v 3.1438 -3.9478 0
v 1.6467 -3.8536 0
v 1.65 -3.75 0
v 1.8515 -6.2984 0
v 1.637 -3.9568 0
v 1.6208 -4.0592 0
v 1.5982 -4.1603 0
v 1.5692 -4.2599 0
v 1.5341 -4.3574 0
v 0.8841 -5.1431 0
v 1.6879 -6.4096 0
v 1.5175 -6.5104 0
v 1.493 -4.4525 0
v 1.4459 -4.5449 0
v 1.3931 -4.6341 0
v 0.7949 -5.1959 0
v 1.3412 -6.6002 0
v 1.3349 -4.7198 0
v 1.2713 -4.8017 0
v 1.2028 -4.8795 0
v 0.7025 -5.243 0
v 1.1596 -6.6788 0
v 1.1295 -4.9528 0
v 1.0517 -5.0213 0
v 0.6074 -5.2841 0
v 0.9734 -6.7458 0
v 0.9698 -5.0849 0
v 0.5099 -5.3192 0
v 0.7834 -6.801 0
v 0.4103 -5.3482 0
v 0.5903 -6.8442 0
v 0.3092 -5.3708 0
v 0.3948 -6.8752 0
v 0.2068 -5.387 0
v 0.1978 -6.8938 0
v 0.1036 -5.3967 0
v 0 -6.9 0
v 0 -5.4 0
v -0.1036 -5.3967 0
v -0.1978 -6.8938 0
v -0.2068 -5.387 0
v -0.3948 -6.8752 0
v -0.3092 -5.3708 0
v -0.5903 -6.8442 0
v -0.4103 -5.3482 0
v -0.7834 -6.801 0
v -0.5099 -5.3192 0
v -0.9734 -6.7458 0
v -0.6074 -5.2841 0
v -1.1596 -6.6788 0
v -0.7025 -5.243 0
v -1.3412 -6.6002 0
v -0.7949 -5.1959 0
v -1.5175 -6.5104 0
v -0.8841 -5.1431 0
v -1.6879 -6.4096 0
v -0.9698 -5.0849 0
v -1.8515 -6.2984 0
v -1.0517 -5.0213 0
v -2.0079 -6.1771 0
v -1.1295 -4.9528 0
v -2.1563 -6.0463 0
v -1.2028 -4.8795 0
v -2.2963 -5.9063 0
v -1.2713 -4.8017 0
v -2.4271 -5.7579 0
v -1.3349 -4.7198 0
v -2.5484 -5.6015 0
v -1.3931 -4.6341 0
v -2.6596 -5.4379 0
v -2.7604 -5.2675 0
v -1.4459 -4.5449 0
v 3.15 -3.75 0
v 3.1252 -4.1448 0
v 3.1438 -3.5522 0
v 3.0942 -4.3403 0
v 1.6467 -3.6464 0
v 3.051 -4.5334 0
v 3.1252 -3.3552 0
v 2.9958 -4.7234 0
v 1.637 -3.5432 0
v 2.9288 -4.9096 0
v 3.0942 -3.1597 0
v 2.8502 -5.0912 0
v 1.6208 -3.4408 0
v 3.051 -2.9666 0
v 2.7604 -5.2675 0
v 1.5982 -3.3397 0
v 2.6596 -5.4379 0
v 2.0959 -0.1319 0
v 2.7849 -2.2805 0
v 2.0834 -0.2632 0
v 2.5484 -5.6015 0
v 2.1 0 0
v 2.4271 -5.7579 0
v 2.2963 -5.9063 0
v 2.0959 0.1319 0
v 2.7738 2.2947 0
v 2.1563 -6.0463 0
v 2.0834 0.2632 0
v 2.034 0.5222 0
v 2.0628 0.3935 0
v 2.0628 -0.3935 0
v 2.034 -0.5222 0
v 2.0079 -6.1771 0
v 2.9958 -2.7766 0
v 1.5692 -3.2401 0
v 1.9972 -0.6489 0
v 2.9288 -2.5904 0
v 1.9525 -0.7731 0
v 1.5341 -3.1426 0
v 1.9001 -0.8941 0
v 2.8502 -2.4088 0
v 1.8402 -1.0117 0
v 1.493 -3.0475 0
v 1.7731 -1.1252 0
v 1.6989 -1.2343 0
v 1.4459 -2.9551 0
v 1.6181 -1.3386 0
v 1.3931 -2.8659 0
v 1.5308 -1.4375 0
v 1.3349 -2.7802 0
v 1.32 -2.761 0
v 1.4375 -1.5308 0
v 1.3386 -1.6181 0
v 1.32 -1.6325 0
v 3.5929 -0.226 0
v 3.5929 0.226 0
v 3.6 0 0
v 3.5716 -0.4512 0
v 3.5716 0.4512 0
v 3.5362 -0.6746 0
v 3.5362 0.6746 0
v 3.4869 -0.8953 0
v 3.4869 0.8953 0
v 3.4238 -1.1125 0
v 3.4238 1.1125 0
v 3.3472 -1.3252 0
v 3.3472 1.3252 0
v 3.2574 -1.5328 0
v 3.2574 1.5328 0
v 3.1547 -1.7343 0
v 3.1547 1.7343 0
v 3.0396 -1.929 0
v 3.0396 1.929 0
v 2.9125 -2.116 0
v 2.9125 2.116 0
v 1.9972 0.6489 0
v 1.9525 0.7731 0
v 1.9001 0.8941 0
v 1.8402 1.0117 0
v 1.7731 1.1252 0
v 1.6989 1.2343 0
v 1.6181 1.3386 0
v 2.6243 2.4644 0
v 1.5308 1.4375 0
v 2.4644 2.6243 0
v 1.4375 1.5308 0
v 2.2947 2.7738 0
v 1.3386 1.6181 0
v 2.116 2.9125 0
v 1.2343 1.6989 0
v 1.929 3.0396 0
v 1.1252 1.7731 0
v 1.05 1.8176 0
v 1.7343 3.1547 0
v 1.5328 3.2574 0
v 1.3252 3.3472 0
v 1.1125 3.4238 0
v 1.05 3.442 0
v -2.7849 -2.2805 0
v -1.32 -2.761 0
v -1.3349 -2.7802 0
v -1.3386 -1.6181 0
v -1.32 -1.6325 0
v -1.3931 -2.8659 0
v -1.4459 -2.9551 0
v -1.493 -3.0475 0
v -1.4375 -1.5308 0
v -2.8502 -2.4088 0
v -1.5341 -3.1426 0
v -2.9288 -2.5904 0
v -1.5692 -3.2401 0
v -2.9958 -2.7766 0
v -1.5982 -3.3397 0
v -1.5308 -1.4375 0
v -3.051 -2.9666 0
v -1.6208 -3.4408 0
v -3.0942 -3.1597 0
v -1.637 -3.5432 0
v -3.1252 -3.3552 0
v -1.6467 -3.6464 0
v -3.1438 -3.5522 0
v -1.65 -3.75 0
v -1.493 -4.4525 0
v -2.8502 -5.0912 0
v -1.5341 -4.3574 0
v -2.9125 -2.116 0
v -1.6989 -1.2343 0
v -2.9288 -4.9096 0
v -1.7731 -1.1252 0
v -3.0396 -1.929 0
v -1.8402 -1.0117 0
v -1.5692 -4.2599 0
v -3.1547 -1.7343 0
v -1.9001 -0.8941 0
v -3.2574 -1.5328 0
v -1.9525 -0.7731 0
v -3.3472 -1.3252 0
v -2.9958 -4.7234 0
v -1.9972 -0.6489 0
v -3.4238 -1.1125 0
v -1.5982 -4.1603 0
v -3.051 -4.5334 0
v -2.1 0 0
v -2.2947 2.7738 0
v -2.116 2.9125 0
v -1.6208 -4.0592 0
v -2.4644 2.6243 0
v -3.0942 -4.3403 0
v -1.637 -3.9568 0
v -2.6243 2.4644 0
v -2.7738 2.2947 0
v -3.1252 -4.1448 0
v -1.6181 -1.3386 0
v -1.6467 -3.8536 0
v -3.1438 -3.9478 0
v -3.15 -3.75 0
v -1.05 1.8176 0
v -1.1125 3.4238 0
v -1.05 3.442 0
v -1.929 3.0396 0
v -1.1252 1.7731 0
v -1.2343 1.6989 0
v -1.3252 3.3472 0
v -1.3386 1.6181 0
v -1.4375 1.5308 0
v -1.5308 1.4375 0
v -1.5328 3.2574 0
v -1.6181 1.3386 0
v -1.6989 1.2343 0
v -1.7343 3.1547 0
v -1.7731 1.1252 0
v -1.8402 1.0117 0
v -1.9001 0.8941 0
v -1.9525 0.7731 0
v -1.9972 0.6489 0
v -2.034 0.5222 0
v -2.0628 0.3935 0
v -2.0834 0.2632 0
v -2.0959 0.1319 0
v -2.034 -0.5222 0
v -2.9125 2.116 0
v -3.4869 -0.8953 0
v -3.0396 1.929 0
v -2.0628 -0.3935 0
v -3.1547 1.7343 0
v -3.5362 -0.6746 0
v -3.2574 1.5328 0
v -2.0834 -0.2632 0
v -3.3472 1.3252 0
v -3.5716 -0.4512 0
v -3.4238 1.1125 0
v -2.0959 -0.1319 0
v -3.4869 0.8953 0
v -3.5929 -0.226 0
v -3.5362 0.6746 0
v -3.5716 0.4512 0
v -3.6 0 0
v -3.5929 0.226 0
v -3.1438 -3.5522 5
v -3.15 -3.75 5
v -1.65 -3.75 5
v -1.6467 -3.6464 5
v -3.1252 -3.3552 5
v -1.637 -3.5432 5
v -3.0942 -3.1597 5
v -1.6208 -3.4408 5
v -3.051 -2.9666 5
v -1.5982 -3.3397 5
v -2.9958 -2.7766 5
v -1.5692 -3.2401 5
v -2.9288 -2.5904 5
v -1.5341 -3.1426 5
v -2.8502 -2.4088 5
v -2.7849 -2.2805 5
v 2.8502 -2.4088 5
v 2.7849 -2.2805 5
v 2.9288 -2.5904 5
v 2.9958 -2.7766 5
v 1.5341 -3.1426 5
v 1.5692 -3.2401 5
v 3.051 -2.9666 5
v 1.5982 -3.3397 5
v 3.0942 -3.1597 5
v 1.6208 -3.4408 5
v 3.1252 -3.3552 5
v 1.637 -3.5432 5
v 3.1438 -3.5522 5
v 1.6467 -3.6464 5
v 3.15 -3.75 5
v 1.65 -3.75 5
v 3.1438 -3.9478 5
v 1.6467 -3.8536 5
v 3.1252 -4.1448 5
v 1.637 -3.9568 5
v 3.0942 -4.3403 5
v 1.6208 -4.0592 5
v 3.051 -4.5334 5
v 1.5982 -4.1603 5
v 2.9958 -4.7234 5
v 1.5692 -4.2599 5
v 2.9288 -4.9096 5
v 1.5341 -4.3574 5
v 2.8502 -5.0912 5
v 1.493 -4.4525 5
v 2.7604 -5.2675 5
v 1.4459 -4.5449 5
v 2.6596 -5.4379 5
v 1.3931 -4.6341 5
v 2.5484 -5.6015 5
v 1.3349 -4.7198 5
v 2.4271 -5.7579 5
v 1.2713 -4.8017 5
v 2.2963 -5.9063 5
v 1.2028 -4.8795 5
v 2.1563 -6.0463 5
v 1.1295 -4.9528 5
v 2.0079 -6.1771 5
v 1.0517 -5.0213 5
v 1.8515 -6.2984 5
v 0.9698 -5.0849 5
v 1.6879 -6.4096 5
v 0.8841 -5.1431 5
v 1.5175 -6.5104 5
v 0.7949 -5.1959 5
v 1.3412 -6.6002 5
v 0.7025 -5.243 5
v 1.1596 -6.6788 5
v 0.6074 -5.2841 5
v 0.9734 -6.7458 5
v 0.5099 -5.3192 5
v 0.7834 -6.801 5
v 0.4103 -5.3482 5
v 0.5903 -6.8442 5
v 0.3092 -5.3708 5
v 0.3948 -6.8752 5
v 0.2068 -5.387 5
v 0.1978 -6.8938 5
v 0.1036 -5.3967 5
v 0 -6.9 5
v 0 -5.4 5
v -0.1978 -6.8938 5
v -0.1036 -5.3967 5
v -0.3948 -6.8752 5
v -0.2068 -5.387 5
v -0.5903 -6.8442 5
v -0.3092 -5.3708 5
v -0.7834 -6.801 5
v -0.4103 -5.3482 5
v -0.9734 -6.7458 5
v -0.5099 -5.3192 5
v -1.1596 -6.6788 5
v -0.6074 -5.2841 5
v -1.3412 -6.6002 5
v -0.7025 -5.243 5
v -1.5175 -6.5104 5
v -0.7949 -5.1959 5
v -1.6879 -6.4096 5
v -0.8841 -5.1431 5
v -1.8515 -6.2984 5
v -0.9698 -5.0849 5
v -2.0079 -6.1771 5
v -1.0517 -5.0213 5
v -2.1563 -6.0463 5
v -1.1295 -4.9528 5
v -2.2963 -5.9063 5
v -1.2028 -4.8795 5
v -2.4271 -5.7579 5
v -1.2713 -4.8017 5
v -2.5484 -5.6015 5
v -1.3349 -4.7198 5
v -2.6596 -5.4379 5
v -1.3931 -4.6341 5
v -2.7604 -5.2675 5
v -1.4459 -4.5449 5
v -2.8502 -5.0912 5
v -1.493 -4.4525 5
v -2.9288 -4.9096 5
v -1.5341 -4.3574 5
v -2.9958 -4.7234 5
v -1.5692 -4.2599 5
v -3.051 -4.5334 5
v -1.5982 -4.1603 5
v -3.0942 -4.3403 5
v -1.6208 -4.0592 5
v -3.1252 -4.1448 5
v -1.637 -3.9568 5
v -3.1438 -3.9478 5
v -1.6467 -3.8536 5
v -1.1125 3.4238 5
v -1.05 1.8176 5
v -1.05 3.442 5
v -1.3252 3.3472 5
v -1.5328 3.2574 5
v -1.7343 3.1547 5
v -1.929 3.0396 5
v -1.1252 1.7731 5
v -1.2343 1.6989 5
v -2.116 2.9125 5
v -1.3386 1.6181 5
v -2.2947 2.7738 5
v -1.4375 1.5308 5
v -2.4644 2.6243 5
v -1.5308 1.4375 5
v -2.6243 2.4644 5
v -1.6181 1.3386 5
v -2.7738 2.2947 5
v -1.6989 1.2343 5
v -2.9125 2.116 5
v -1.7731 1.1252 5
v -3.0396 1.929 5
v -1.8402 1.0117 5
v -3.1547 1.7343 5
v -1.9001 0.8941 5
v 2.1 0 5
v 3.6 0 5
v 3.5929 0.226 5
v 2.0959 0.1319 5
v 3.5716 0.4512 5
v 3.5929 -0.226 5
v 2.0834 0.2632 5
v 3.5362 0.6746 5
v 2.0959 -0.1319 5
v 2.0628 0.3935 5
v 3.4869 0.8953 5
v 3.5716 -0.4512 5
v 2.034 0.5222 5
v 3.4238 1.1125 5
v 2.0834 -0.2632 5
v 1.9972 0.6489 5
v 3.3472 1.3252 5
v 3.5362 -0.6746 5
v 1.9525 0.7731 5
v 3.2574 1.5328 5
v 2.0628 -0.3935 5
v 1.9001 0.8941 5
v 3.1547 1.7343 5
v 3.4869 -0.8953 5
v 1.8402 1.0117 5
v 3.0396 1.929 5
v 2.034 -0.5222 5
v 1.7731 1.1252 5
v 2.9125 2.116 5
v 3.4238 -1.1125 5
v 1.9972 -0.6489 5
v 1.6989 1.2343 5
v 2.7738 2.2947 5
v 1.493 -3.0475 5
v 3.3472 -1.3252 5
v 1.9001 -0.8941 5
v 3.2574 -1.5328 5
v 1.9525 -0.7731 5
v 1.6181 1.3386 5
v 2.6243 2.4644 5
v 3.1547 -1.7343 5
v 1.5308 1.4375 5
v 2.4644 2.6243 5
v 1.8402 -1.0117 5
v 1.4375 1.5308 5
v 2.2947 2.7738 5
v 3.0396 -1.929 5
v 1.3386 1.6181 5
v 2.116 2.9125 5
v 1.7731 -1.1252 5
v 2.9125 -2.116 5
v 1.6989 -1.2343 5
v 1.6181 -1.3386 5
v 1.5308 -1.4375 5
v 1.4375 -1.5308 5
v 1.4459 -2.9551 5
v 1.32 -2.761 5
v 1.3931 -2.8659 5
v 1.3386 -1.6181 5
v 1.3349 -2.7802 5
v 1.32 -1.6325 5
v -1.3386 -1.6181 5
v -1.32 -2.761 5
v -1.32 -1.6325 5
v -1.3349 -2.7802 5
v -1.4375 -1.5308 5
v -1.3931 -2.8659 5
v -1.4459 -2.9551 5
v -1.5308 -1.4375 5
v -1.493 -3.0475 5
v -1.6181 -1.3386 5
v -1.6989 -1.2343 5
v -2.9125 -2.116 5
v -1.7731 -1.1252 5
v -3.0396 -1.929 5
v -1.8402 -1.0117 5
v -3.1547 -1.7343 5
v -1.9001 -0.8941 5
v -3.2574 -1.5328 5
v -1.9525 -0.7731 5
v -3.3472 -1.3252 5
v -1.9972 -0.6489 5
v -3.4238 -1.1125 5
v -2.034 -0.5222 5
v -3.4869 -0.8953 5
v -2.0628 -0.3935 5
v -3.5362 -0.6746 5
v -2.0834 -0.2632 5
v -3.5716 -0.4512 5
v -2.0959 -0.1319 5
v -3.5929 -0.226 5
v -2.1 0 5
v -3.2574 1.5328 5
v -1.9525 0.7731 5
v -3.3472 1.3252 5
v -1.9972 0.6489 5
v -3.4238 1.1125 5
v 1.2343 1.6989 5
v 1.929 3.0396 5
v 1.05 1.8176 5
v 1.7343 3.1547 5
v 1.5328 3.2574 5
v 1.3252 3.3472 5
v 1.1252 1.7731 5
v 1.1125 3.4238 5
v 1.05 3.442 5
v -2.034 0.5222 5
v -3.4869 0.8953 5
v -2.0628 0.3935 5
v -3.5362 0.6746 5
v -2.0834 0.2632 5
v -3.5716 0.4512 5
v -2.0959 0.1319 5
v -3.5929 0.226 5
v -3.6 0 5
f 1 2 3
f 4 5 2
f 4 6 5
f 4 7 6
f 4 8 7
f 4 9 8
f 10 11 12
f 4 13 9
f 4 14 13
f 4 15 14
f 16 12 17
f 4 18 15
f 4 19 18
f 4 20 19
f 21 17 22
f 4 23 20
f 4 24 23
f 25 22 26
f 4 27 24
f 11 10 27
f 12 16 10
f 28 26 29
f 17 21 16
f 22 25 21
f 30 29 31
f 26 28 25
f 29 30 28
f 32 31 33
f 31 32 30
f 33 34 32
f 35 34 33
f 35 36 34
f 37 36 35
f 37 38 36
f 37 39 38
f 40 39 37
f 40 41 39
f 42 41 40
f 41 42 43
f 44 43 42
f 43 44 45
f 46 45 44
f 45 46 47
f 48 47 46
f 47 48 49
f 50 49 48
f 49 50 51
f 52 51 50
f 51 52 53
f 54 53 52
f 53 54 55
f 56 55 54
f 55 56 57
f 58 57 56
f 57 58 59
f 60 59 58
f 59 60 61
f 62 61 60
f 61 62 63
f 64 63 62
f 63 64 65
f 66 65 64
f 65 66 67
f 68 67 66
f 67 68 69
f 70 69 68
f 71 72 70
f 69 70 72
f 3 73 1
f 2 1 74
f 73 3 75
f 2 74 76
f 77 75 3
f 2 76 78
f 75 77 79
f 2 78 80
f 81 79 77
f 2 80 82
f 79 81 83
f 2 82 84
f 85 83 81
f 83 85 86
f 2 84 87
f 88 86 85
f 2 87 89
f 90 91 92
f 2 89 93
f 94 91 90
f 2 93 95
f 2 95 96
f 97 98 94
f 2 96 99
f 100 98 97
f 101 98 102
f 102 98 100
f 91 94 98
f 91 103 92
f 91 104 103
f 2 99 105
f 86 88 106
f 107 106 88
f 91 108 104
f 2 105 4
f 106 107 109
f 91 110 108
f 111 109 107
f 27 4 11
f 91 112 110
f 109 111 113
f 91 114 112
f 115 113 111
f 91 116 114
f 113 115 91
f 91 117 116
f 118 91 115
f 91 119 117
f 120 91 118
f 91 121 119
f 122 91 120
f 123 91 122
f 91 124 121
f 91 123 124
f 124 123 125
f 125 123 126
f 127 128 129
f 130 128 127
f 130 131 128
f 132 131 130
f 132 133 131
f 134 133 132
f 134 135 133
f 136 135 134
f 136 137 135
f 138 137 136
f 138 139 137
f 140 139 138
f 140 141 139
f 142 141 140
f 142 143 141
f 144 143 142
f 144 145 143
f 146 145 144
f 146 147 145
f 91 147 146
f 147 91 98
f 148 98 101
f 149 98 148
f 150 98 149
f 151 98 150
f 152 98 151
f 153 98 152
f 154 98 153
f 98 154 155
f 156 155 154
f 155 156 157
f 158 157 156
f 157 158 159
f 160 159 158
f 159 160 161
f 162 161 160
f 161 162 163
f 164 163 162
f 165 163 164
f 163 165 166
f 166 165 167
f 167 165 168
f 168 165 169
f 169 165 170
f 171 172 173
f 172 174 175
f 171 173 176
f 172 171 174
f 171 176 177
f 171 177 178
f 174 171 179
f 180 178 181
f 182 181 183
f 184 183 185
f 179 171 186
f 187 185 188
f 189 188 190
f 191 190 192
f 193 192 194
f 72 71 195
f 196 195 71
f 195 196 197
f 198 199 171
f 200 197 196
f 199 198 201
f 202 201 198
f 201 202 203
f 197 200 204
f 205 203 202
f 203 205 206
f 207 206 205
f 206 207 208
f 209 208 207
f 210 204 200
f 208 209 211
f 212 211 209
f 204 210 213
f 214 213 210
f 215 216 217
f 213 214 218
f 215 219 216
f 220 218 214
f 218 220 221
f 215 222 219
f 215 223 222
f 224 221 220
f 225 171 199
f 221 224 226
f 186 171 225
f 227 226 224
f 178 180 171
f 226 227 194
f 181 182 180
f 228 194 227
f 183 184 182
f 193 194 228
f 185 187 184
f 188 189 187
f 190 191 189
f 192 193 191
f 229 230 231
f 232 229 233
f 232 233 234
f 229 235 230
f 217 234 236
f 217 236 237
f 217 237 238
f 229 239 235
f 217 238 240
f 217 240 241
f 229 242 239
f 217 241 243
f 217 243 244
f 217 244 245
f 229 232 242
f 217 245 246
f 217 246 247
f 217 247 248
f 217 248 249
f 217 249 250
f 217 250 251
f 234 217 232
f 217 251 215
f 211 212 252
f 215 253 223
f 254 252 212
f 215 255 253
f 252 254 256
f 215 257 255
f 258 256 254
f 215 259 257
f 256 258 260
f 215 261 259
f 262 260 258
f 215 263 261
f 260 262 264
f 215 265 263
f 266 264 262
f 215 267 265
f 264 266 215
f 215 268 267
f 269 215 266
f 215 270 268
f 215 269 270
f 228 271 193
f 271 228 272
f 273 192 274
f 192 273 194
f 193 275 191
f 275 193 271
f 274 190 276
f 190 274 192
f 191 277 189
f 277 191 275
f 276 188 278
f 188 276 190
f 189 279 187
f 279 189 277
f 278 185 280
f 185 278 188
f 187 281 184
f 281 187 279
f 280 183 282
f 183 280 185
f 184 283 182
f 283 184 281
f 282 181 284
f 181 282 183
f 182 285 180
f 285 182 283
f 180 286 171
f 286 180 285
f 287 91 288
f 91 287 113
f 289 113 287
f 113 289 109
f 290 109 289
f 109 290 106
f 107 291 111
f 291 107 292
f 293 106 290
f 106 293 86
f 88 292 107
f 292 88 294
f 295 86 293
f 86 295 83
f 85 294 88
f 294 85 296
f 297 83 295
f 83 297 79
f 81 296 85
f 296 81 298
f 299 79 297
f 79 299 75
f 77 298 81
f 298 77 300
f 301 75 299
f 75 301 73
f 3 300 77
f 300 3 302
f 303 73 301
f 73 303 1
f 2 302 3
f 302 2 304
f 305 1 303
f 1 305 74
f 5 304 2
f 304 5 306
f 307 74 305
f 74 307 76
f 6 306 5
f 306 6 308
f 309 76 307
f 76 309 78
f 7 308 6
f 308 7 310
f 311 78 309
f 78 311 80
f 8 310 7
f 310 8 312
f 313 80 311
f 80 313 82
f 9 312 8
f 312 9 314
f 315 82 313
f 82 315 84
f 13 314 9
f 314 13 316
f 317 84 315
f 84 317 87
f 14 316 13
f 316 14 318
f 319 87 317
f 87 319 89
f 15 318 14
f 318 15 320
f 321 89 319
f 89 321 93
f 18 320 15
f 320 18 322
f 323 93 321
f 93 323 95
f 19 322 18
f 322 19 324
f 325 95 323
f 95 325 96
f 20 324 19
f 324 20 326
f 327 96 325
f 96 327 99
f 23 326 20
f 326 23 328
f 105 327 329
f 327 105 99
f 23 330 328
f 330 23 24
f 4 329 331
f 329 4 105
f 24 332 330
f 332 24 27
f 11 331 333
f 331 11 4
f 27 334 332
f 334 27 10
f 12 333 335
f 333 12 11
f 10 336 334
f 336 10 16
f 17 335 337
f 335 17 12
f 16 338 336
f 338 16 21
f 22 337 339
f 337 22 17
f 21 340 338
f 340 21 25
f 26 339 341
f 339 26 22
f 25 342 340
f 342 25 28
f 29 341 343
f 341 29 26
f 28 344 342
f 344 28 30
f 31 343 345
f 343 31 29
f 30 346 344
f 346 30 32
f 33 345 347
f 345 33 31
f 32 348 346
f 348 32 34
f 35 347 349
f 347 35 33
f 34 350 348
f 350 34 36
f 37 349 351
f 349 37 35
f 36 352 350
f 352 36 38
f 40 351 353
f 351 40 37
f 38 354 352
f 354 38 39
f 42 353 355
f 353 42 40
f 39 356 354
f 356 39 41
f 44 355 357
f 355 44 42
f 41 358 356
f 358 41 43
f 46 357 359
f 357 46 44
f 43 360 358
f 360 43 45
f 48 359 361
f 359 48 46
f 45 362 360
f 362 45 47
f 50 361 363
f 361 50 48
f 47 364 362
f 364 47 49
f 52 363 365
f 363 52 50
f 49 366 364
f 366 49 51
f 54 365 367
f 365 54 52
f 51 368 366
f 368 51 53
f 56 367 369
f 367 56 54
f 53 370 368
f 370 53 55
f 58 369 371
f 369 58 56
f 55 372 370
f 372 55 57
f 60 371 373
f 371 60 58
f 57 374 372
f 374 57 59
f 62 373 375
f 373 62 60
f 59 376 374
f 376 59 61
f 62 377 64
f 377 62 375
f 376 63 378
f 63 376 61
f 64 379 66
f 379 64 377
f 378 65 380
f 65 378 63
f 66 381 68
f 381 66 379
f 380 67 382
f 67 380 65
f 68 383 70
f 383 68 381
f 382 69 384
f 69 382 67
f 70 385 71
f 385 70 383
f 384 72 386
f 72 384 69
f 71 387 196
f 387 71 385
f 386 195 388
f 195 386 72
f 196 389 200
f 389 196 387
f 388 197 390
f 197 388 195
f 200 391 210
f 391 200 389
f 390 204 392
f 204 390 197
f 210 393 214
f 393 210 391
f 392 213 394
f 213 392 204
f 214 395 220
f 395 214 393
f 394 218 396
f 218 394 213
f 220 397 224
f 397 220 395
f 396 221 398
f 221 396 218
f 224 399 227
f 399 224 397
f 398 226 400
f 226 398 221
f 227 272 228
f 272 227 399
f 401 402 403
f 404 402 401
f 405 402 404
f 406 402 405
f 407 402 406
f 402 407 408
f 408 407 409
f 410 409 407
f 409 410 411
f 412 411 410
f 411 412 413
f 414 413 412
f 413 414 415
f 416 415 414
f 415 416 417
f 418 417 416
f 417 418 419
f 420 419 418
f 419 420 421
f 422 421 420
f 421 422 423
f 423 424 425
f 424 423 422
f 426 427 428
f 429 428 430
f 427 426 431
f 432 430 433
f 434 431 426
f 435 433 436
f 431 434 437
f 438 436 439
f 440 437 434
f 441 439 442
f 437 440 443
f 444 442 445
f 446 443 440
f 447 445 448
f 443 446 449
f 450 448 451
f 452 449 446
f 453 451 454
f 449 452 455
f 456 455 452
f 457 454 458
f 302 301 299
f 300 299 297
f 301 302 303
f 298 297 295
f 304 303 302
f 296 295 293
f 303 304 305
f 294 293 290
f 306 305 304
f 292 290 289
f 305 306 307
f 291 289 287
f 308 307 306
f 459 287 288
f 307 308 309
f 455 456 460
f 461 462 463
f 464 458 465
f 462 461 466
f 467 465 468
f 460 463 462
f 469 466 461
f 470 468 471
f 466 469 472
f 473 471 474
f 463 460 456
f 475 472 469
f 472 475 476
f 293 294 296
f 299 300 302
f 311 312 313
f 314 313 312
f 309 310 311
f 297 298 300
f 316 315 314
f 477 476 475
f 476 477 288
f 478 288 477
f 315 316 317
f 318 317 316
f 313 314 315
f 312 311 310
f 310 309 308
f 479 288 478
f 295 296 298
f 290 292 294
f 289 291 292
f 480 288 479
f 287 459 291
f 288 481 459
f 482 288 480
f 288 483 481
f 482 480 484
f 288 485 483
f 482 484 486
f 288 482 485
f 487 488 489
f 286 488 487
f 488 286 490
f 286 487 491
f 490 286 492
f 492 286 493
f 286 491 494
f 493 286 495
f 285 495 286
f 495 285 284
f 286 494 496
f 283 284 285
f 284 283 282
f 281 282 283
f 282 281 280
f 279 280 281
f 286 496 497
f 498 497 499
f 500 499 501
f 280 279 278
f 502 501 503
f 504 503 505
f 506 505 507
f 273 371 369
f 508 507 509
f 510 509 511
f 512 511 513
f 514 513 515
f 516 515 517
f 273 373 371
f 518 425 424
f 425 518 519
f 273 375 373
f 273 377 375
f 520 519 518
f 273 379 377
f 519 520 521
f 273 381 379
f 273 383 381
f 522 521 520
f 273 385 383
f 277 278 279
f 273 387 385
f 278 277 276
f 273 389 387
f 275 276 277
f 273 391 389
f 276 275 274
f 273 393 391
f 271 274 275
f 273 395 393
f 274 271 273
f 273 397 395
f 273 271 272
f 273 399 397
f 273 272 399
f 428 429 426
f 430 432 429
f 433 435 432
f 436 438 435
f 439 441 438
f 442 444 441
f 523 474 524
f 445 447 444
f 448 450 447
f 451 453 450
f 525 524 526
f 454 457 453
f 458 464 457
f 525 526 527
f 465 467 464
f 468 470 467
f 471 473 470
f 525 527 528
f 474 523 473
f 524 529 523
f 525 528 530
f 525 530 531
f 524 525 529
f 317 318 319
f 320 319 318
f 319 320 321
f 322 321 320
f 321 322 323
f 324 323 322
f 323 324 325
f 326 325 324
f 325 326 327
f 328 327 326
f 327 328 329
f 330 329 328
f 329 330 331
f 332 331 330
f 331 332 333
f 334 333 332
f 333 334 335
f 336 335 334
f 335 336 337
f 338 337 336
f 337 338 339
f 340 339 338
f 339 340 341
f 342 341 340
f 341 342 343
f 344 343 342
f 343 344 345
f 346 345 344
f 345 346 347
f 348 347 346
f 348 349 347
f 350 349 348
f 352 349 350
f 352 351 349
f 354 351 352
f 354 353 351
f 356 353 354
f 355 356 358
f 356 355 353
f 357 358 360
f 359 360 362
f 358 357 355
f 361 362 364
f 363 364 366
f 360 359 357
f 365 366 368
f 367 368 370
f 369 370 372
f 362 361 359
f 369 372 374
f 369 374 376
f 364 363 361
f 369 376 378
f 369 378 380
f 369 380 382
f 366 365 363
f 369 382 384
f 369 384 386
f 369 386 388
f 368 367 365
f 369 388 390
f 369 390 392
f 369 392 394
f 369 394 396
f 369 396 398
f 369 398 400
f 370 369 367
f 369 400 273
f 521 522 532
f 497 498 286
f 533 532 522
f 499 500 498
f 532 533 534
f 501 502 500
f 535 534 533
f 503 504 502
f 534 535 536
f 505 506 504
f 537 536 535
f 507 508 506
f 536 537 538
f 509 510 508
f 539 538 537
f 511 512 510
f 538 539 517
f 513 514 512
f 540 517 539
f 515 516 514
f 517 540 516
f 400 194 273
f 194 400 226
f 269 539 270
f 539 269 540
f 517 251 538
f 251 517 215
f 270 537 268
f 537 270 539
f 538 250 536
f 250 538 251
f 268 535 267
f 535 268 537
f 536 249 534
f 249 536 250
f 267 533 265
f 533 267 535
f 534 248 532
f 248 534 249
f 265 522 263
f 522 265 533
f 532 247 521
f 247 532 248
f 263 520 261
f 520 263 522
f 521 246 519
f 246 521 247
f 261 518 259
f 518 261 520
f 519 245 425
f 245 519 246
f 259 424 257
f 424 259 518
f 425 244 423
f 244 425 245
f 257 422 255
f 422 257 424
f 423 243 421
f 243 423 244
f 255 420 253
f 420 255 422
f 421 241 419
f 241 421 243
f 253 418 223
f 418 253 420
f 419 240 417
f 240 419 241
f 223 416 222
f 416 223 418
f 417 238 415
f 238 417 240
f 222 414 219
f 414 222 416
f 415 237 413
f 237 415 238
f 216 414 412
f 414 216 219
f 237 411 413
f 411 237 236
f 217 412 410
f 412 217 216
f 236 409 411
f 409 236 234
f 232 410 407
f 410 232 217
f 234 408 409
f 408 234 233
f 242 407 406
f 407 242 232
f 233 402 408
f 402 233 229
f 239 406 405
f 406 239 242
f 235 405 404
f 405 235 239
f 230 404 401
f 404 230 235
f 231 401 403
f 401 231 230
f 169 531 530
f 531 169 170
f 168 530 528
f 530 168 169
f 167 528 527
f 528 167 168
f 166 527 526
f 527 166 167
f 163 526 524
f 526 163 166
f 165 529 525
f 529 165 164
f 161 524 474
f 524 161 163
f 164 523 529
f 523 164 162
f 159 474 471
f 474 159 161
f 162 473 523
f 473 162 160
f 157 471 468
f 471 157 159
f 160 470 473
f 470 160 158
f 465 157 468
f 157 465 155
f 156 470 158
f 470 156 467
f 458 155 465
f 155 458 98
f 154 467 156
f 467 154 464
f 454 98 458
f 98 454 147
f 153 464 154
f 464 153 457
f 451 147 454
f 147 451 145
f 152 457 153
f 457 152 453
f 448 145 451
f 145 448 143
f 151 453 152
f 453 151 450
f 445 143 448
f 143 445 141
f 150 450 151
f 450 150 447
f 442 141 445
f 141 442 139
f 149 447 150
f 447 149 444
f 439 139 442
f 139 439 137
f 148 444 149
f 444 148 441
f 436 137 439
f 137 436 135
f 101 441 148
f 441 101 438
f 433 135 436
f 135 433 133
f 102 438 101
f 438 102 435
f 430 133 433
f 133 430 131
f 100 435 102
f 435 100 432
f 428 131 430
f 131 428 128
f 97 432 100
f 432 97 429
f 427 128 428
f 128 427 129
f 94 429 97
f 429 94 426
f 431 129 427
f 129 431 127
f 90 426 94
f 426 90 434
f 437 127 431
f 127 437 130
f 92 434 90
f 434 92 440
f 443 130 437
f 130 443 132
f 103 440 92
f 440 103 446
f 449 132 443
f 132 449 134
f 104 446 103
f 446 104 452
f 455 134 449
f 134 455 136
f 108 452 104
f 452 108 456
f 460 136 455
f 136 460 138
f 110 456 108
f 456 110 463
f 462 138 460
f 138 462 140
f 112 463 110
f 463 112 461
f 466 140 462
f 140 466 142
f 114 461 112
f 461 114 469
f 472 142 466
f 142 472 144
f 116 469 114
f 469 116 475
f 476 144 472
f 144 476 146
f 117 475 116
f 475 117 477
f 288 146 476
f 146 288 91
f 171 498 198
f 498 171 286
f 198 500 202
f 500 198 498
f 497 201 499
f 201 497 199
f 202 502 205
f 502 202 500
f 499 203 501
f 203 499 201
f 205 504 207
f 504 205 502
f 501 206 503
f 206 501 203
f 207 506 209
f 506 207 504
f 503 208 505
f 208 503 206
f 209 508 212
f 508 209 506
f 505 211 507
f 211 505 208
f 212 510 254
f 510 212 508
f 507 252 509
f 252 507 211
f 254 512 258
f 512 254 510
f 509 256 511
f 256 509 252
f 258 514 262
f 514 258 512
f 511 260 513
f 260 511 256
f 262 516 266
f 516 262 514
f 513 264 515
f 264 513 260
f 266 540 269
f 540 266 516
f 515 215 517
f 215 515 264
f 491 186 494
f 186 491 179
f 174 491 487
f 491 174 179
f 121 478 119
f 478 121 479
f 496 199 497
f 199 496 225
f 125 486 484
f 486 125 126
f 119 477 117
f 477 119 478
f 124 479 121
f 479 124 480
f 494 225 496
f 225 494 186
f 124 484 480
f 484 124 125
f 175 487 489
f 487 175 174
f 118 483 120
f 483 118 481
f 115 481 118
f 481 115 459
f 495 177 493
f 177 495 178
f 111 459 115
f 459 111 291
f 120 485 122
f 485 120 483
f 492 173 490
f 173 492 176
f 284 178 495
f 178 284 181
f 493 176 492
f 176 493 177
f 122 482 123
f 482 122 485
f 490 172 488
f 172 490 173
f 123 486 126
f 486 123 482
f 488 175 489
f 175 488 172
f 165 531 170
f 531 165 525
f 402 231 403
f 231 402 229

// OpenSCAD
/*
    (c) by Marc Hoppe, 2018

    This program is free software: you can redistribute it and/or modify
    it under the terms of the GNU General Public License as published by
    the Free Software Foundation, either version 3 of the License, or
    (at your option) any later version.

    This program is distributed in the hope that it will be useful,
    but WITHOUT ANY WARRANTY; without even the implied warranty of
    MERCHANTABILITY or FITNESS FOR A PARTICULAR PURPOSE.  See the
    GNU General Public License for more details.

    You should have received a copy of the GNU General Public License
    along with this program.  If not, see <https://www.gnu.org/licenses/>.
*/

$fn=100;

r1=4.2/2;
r2=3.3/2;
d=1.5;
h=5;

module doppelring()
{
translate([0,-(r1+r2),0]) ring(r2, 180) square([d,h]);
ring(r1) square([d,h]);
}

difference() {
doppelring();
translate([0,0,-1]) cylinder(r=r1, h=h+2);
translate([0,-(r1+r2),-1]) cylinder(r=r2, h=h+2);
translate([-(r2*1.6/2),-(r1+r2/2),-1]) cube([r2*1.6,r2,h+2]);
translate([-(r1/2),r1/2, -1]) cube([r1, 2*r1, h+2]);
}

	
module teilring(r=36, w=25)
{
	l=r*5;

	difference() {
		translate ([0,0,1]) rotate([0,0,0]) ring(r) children();
	translate ([-l/2,0,-l/2]) cube( [l,l,l]);
	translate ([-0,-0,-l/2]) rotate([0,0,180+w]) cube( [l,l,l] );   
	}
}

module ring(r){
    rotate_extrude()
    translate( [r,0,0] ) children();
}
